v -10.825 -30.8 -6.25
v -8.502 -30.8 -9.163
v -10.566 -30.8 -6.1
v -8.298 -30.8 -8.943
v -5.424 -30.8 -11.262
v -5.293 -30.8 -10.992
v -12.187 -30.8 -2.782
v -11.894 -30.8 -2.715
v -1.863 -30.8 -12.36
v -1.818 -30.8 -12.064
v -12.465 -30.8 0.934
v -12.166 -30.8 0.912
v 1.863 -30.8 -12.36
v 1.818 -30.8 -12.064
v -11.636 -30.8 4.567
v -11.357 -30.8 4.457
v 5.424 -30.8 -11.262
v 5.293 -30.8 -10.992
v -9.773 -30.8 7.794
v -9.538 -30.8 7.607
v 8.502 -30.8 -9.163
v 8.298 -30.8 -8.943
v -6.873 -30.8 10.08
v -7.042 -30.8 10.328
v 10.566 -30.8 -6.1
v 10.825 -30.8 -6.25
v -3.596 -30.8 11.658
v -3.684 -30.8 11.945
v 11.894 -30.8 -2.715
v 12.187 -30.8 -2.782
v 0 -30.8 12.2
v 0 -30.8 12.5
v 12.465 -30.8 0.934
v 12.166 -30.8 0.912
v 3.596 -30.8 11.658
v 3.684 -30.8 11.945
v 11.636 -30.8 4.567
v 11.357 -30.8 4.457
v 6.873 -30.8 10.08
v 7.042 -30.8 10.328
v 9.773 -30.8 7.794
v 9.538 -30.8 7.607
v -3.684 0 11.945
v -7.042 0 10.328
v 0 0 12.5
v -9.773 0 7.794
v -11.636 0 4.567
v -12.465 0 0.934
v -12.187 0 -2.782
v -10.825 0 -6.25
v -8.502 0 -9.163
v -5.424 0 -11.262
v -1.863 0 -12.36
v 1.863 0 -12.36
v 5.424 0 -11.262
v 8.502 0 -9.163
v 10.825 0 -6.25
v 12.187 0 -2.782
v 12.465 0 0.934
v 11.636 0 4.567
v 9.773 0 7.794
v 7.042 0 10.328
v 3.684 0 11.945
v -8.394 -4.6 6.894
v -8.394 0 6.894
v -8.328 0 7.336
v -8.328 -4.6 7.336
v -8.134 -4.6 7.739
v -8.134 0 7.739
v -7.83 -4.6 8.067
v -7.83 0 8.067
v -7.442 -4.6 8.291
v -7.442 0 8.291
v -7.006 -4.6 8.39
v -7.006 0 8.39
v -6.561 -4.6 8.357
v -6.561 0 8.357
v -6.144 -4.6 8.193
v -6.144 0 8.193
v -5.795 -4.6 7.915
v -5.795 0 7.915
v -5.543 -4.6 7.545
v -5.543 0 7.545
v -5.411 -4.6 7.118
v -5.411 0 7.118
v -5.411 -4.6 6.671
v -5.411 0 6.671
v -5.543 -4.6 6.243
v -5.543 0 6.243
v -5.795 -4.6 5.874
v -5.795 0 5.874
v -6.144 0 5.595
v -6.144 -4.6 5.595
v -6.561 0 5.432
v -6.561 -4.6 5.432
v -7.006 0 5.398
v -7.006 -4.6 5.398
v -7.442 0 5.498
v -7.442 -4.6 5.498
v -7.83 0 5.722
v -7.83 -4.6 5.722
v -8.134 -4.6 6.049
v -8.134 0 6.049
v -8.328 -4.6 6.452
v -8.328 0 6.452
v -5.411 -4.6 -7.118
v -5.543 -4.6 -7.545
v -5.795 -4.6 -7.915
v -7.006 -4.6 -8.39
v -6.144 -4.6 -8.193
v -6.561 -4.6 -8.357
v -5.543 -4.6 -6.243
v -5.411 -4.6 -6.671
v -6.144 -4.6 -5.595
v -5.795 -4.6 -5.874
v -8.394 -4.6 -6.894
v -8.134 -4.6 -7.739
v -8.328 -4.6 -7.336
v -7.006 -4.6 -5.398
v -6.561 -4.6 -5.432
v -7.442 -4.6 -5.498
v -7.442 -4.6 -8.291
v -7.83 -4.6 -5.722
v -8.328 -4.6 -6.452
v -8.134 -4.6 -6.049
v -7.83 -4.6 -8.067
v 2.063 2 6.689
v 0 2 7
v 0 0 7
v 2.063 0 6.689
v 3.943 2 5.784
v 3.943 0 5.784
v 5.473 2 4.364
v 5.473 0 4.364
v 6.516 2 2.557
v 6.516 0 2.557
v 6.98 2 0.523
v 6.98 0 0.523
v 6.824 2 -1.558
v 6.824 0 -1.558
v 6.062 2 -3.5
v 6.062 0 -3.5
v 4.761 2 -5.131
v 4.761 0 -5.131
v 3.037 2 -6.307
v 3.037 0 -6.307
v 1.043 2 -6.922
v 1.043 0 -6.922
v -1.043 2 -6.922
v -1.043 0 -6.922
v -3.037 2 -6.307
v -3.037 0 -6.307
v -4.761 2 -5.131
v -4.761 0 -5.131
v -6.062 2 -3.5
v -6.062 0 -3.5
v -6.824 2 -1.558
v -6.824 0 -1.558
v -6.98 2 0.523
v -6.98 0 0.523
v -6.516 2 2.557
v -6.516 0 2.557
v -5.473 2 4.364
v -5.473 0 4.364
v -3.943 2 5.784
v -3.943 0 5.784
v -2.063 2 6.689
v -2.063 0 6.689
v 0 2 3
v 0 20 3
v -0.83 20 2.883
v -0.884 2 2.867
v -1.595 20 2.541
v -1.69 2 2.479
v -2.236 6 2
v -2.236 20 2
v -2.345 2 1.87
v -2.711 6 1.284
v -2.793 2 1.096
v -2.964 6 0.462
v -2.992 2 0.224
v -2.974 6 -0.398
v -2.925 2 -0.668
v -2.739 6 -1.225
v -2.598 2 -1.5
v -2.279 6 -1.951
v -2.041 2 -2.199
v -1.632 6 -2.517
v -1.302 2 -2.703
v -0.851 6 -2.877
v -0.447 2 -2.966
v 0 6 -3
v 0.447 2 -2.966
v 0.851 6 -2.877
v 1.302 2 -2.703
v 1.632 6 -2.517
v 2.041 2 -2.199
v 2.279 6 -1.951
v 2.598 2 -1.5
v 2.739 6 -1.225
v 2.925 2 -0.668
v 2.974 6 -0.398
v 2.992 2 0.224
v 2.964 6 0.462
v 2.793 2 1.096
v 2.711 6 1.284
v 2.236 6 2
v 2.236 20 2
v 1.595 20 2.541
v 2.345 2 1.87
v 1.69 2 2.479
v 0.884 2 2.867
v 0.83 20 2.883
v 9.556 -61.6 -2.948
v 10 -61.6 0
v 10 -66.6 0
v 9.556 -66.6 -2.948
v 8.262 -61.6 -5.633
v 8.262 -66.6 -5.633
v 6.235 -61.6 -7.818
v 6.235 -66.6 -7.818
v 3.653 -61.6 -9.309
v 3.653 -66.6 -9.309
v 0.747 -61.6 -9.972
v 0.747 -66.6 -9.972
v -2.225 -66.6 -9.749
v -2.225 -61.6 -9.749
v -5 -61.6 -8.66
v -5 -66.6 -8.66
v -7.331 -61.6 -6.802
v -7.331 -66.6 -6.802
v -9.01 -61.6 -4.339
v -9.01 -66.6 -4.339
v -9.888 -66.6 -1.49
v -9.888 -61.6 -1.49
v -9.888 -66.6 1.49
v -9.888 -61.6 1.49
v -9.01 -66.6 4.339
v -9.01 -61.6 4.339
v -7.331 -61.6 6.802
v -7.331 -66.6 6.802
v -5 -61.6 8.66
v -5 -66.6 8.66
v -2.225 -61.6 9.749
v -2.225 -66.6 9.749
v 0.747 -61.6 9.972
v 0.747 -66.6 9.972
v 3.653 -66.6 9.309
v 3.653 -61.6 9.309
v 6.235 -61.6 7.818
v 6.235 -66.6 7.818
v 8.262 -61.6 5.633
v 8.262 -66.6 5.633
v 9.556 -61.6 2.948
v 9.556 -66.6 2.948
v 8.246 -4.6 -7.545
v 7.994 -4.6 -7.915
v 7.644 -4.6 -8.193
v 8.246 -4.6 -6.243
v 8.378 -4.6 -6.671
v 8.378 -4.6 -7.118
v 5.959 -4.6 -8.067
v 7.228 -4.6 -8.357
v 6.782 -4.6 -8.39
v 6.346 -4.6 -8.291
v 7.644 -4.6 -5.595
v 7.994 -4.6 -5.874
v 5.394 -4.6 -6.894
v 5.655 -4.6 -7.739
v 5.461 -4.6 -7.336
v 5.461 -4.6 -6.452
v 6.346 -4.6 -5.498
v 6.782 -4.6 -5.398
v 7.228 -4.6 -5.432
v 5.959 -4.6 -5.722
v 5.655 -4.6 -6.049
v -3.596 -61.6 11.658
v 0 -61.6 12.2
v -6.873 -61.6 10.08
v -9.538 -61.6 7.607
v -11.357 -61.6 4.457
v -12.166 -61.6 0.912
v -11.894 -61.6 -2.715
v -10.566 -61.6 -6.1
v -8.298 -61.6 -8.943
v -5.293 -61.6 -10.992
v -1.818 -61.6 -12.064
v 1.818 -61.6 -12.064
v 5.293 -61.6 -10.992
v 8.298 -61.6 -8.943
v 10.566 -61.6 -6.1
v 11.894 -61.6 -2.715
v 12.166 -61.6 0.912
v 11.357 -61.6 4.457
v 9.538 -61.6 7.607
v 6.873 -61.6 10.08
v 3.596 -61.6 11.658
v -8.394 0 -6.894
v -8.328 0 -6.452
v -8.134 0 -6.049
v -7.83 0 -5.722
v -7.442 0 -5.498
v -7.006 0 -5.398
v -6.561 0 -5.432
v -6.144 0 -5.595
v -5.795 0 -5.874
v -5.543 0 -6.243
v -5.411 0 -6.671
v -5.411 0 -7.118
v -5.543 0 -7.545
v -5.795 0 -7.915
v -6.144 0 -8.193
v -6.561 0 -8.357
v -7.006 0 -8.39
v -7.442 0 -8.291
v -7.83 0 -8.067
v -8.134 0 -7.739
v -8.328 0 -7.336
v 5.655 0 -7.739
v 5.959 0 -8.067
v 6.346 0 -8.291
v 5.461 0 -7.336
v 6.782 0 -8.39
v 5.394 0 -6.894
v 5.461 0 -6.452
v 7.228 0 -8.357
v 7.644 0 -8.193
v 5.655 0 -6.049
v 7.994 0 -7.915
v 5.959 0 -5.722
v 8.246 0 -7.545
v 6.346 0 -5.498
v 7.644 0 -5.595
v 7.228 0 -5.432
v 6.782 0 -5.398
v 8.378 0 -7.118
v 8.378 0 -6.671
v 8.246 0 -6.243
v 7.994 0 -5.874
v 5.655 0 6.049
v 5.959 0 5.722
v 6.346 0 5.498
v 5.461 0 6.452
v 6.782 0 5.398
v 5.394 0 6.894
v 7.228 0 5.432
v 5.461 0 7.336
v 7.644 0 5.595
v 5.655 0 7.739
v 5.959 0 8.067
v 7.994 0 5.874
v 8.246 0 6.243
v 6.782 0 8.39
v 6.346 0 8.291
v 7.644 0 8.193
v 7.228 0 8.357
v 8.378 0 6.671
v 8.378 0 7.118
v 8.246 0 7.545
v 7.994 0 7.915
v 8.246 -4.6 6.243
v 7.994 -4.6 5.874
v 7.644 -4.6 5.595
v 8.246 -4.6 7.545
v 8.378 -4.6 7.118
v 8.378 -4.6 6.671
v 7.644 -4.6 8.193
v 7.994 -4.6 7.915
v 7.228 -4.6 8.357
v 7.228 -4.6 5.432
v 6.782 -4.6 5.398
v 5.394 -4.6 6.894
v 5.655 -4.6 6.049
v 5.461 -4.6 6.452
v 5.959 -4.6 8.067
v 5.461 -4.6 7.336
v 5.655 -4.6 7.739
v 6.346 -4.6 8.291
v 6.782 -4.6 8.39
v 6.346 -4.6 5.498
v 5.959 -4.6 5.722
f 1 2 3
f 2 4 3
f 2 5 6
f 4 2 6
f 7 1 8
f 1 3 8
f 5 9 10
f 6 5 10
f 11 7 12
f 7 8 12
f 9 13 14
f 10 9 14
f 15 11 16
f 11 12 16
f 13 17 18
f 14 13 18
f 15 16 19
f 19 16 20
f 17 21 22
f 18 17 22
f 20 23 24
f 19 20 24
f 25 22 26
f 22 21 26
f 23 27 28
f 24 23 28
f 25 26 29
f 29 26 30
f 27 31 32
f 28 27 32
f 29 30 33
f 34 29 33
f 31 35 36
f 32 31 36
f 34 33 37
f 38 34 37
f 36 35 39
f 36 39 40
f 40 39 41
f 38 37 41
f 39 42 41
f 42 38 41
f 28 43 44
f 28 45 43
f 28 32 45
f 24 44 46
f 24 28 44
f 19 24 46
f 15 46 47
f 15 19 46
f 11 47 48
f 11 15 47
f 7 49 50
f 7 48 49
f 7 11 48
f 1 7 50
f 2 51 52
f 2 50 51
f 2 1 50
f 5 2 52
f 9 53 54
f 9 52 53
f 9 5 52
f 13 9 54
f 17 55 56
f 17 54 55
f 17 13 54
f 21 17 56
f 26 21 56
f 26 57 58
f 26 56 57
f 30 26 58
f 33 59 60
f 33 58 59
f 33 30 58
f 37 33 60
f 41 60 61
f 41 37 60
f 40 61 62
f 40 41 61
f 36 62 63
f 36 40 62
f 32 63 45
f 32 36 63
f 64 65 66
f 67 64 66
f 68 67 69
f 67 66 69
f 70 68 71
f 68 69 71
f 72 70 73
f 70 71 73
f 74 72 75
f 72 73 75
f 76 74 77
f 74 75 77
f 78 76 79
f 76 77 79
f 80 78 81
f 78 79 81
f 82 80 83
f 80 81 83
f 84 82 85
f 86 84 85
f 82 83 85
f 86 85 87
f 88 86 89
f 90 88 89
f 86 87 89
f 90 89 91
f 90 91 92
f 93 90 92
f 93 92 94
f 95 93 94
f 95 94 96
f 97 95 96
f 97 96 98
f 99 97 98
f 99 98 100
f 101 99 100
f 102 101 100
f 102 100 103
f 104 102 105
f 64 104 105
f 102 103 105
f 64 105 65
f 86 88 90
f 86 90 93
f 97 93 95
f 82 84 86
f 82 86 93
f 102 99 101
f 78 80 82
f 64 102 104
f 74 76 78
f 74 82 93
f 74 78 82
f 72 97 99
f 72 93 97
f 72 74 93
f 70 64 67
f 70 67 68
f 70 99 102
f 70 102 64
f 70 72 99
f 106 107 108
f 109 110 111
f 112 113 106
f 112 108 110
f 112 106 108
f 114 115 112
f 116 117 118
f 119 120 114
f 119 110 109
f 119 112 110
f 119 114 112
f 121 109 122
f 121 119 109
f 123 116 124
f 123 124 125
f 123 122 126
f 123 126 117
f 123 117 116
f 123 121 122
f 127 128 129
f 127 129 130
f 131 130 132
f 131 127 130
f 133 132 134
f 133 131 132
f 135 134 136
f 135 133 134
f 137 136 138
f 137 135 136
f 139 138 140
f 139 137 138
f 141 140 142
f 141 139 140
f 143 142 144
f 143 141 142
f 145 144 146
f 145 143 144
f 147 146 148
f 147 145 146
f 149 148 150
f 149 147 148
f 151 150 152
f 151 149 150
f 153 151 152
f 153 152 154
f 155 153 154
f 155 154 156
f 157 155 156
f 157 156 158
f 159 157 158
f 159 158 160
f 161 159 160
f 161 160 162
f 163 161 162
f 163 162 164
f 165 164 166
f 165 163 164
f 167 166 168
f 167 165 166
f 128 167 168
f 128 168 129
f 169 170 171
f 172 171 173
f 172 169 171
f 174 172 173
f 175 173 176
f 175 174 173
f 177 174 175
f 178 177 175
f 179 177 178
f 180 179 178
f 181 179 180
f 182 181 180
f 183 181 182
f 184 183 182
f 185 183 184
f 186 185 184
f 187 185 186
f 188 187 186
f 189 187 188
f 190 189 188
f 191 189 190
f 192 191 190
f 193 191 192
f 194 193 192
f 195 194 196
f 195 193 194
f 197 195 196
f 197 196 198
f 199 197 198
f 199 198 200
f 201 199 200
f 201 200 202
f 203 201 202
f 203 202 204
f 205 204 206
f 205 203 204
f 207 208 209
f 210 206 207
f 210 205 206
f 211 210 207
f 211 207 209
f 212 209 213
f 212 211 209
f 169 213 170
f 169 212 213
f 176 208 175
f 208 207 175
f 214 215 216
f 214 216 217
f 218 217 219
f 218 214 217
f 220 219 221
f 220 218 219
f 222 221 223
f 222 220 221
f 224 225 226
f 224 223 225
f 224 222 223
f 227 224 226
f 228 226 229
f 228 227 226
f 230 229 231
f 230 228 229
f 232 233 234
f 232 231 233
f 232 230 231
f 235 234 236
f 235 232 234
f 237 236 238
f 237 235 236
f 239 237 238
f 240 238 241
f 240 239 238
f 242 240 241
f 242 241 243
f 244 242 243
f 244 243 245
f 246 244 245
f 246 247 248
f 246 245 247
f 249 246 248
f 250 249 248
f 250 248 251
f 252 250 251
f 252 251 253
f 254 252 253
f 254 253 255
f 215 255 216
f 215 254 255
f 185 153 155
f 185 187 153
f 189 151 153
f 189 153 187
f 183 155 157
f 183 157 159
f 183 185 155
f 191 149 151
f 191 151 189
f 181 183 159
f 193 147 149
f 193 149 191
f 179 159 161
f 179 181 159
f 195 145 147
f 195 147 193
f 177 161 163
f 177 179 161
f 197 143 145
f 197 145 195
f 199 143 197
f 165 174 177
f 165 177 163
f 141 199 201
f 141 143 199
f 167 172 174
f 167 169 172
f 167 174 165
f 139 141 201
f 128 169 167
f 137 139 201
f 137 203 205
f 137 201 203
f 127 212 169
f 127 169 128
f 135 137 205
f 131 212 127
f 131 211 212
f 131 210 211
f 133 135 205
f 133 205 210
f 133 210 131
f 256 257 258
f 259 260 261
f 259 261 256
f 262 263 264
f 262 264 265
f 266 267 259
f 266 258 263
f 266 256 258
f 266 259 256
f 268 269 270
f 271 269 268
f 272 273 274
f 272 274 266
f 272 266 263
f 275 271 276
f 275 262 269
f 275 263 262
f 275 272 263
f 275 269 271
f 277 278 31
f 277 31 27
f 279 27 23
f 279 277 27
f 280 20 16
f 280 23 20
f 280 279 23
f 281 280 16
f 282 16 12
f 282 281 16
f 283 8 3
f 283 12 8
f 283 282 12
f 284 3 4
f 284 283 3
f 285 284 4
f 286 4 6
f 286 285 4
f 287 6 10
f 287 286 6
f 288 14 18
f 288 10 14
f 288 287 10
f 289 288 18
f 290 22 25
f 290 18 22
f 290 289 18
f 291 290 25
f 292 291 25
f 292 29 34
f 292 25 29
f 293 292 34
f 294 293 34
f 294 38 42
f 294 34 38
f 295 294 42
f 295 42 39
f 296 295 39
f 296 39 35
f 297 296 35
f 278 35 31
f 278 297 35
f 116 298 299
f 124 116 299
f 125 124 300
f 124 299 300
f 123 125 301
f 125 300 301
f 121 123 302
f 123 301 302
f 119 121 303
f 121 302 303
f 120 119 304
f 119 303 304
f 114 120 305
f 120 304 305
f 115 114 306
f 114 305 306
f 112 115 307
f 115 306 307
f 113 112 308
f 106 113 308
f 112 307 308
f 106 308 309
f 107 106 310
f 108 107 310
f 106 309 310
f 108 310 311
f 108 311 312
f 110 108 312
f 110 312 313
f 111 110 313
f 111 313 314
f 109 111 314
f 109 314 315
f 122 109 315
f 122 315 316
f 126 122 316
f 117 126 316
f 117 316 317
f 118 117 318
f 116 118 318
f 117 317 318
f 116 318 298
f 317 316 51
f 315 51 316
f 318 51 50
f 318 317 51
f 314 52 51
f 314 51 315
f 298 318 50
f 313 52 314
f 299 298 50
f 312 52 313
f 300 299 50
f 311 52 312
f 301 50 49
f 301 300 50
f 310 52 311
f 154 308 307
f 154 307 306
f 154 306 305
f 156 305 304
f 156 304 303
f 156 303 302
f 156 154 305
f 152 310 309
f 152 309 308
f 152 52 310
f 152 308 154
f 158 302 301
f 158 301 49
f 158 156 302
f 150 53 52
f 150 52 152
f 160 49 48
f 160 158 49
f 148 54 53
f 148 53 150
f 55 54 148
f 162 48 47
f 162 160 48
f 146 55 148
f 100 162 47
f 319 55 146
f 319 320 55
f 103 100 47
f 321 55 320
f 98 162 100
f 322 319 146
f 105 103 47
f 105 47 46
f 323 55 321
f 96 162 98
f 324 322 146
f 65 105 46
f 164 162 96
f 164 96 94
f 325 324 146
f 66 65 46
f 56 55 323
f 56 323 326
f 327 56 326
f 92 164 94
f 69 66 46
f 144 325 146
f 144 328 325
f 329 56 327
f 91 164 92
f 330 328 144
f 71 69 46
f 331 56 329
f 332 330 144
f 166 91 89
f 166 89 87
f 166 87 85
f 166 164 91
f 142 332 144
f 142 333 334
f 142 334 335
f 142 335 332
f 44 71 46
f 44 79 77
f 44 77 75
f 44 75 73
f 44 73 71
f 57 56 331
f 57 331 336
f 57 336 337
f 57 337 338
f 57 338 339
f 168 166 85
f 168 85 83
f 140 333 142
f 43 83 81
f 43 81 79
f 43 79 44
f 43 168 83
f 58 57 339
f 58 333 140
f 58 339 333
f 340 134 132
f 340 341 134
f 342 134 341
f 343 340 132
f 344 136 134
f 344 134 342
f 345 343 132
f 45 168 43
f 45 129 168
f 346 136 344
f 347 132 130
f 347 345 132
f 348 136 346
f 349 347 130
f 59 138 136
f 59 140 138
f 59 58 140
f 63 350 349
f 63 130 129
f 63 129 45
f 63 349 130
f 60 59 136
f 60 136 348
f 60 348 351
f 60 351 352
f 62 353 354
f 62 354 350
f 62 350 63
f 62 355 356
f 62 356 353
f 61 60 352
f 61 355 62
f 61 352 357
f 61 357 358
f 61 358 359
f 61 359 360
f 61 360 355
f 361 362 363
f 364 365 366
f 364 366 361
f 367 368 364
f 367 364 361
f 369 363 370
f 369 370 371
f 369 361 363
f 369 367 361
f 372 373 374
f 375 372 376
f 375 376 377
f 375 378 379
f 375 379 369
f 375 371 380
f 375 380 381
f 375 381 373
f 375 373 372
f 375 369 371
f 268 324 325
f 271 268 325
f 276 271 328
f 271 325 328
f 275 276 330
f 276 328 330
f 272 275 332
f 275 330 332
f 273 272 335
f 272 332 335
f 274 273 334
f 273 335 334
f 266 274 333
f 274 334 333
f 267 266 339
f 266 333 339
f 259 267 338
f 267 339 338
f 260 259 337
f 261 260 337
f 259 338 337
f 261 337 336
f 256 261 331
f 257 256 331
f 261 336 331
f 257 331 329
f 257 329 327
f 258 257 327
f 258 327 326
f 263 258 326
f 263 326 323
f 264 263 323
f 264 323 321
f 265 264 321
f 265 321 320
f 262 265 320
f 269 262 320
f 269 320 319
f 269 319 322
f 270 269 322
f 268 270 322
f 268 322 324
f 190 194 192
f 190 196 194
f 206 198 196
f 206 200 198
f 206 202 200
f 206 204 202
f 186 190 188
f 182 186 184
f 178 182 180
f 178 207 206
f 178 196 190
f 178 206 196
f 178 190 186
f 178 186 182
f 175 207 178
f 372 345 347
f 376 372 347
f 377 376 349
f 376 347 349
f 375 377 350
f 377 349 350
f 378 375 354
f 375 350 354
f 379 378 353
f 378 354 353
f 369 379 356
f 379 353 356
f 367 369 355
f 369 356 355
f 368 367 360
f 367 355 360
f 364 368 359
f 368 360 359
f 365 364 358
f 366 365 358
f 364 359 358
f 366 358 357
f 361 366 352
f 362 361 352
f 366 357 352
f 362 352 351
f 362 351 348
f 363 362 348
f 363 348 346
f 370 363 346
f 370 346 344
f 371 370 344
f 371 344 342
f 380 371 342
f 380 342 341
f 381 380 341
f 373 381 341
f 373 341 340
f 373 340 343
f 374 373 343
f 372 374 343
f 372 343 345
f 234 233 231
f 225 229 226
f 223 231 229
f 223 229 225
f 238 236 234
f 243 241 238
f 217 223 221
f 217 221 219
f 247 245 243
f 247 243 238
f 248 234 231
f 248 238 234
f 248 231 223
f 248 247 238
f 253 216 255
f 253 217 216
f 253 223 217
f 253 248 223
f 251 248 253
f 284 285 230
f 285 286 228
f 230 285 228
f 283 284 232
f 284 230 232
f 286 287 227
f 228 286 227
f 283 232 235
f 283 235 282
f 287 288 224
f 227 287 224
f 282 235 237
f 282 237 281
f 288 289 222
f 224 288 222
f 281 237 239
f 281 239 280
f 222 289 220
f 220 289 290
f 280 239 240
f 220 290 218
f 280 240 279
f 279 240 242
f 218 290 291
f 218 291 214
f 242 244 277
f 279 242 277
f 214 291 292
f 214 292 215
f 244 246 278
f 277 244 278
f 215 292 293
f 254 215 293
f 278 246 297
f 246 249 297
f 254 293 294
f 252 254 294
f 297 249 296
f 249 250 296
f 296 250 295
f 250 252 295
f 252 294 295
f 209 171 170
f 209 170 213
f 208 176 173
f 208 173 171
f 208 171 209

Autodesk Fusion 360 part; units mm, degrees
sketch "Sketch1" plane through (0, 0, 0) normal (1, 0, 0) x (0, 1, 0)
  line L0 (0, 7) -> (2, 7)
  line L1 (2, 7) -> (2, 0)
  line L2 (0, 0) -> (0, 12.5)
  line L3 (0, 12.5) -> (-30.8, 12.5)
  line L4 (-30.8, 12.5) -> (-30.8, 0)
  line L5 (-30.8, 12.2) -> (-61.6, 12.2)
  line L6 (-61.6, 12.2) -> (-61.6, 0)
  line L7 (-61.6, 0) -> (0, 0)
  line L8 (2, 3) -> (15, 3)
  line L9 (15, 3) -> (15, 0)
  line L10 (15, 0) -> (0, 0)
  line L11 (-61.6, -12.2) -> (-61.6, 0)
  line L12 (-30.8, -12.2) -> (-61.6, -12.2)
  line L13 (-30.8, -12.5) -> (-30.8, 0)
  line L14 (0, -12.5) -> (-30.8, -12.5)
  line L15 (0, 0) -> (0, -12.5)
  line L16 (0, -7) -> (2, -7)
  line L17 (2, -7) -> (2, 0)
  line L18 (2, -3) -> (15, -3)
  line L19 (15, -3) -> (15, 0)
  dimension "d1" = 25
  dimension "d2" = 24.4
  dimension "d3" = 14
  dimension "d4" = 6
  dimension "d5" = 15
  dimension "d7" = 30.8
  dimension "d8" = 30.8
  dimension "d9" = 2
revolve "Revolve1" add sketch "Sketch1" angle 360 about axis through (0, 1.75, 0) along (0, 1, 0) contours L0 L1 L2 L10 | L2 L3 L4 L7 | L1 L8 L9 L10 | L4 L5 L6 L7
sketch "Sketch2" plane through (0, 15, 0) normal (0, 1, 0) x (-1, 0, 0)
  circle A0 centre (0, 0) radius 3
  circle A1 centre (0, 0) radius 3
  line L0 (-2.2361, 2) -> (2.2361, 2)
  line L1 (0, 0) -> (0, -3)
  point P0 (0, -3)
  dimension "d11" = 6
  dimension "d12" = 5
extrude "Extrude1" cut sketch "Sketch2" against normal blind 9 contours A0 A1 L0 picked at (-0.1433, 0.3437)
sketch "Sketch3" plane through (0, 0, 0) normal (0, 1, 0) x (-1, 0, 0)
  circle A0 centre (0, 0) radius 12.5
  circle A1 centre (0, 0) radius 7
  circle A2 centre (-6.8943, 6.8943) radius 1.5
  circle A3 centre (6.8943, 6.8943) radius 1.5
  circle A4 centre (6.8943, -6.8943) radius 1.5
  circle A5 centre (-6.8943, -6.8943) radius 1.5
  line L0 (0, 0) -> (-6.8943, 6.8943)
  line L1 (0, 0) -> (6.8943, 6.8943)
  line L2 (6.8943, -6.8943) -> (0, 0)
  line L3 (0, 0) -> (-6.8943, -6.8943)
  circle A6 centre (0, 0) radius 9.75
  line L4 (0, 0) -> (2.2693, 0)
  dimension "d15" = 3
  dimension "d16" = 19.5
  dimension "d20" = 45
extrude "Extrude2" cut sketch "Sketch3" against normal blind 4.6 contours A3 L1 A6 | A3 L1 A6 | A4 L2 A6 | A4 L2 A6 | A2 L0 A6 | A2 L0 A6 | A3 A6 | A5 L3 A6 | A5 L3 A6 | A4 A6 | A2 A6 | A5 A6
sketch "Sketch4" plane through (0, -61.6, 0) normal (0, -1, 0) x (1, 0, 0)
  circle A0 centre (0, 0) radius 12.2
  circle A1 centre (0, 0) radius 10
  dimension "d23" = 20
extrude "Extrude3" add sketch "Sketch4" along normal blind 5 contours A1
extrude "Extrude4" add 1 faces at (-0.4082, 15, 2.4414) along direction (0, 1, 0) blind 5
equation "d16 = 14 mm + ( ( 25 - 14 ) / 2 ) * 1 mm"
